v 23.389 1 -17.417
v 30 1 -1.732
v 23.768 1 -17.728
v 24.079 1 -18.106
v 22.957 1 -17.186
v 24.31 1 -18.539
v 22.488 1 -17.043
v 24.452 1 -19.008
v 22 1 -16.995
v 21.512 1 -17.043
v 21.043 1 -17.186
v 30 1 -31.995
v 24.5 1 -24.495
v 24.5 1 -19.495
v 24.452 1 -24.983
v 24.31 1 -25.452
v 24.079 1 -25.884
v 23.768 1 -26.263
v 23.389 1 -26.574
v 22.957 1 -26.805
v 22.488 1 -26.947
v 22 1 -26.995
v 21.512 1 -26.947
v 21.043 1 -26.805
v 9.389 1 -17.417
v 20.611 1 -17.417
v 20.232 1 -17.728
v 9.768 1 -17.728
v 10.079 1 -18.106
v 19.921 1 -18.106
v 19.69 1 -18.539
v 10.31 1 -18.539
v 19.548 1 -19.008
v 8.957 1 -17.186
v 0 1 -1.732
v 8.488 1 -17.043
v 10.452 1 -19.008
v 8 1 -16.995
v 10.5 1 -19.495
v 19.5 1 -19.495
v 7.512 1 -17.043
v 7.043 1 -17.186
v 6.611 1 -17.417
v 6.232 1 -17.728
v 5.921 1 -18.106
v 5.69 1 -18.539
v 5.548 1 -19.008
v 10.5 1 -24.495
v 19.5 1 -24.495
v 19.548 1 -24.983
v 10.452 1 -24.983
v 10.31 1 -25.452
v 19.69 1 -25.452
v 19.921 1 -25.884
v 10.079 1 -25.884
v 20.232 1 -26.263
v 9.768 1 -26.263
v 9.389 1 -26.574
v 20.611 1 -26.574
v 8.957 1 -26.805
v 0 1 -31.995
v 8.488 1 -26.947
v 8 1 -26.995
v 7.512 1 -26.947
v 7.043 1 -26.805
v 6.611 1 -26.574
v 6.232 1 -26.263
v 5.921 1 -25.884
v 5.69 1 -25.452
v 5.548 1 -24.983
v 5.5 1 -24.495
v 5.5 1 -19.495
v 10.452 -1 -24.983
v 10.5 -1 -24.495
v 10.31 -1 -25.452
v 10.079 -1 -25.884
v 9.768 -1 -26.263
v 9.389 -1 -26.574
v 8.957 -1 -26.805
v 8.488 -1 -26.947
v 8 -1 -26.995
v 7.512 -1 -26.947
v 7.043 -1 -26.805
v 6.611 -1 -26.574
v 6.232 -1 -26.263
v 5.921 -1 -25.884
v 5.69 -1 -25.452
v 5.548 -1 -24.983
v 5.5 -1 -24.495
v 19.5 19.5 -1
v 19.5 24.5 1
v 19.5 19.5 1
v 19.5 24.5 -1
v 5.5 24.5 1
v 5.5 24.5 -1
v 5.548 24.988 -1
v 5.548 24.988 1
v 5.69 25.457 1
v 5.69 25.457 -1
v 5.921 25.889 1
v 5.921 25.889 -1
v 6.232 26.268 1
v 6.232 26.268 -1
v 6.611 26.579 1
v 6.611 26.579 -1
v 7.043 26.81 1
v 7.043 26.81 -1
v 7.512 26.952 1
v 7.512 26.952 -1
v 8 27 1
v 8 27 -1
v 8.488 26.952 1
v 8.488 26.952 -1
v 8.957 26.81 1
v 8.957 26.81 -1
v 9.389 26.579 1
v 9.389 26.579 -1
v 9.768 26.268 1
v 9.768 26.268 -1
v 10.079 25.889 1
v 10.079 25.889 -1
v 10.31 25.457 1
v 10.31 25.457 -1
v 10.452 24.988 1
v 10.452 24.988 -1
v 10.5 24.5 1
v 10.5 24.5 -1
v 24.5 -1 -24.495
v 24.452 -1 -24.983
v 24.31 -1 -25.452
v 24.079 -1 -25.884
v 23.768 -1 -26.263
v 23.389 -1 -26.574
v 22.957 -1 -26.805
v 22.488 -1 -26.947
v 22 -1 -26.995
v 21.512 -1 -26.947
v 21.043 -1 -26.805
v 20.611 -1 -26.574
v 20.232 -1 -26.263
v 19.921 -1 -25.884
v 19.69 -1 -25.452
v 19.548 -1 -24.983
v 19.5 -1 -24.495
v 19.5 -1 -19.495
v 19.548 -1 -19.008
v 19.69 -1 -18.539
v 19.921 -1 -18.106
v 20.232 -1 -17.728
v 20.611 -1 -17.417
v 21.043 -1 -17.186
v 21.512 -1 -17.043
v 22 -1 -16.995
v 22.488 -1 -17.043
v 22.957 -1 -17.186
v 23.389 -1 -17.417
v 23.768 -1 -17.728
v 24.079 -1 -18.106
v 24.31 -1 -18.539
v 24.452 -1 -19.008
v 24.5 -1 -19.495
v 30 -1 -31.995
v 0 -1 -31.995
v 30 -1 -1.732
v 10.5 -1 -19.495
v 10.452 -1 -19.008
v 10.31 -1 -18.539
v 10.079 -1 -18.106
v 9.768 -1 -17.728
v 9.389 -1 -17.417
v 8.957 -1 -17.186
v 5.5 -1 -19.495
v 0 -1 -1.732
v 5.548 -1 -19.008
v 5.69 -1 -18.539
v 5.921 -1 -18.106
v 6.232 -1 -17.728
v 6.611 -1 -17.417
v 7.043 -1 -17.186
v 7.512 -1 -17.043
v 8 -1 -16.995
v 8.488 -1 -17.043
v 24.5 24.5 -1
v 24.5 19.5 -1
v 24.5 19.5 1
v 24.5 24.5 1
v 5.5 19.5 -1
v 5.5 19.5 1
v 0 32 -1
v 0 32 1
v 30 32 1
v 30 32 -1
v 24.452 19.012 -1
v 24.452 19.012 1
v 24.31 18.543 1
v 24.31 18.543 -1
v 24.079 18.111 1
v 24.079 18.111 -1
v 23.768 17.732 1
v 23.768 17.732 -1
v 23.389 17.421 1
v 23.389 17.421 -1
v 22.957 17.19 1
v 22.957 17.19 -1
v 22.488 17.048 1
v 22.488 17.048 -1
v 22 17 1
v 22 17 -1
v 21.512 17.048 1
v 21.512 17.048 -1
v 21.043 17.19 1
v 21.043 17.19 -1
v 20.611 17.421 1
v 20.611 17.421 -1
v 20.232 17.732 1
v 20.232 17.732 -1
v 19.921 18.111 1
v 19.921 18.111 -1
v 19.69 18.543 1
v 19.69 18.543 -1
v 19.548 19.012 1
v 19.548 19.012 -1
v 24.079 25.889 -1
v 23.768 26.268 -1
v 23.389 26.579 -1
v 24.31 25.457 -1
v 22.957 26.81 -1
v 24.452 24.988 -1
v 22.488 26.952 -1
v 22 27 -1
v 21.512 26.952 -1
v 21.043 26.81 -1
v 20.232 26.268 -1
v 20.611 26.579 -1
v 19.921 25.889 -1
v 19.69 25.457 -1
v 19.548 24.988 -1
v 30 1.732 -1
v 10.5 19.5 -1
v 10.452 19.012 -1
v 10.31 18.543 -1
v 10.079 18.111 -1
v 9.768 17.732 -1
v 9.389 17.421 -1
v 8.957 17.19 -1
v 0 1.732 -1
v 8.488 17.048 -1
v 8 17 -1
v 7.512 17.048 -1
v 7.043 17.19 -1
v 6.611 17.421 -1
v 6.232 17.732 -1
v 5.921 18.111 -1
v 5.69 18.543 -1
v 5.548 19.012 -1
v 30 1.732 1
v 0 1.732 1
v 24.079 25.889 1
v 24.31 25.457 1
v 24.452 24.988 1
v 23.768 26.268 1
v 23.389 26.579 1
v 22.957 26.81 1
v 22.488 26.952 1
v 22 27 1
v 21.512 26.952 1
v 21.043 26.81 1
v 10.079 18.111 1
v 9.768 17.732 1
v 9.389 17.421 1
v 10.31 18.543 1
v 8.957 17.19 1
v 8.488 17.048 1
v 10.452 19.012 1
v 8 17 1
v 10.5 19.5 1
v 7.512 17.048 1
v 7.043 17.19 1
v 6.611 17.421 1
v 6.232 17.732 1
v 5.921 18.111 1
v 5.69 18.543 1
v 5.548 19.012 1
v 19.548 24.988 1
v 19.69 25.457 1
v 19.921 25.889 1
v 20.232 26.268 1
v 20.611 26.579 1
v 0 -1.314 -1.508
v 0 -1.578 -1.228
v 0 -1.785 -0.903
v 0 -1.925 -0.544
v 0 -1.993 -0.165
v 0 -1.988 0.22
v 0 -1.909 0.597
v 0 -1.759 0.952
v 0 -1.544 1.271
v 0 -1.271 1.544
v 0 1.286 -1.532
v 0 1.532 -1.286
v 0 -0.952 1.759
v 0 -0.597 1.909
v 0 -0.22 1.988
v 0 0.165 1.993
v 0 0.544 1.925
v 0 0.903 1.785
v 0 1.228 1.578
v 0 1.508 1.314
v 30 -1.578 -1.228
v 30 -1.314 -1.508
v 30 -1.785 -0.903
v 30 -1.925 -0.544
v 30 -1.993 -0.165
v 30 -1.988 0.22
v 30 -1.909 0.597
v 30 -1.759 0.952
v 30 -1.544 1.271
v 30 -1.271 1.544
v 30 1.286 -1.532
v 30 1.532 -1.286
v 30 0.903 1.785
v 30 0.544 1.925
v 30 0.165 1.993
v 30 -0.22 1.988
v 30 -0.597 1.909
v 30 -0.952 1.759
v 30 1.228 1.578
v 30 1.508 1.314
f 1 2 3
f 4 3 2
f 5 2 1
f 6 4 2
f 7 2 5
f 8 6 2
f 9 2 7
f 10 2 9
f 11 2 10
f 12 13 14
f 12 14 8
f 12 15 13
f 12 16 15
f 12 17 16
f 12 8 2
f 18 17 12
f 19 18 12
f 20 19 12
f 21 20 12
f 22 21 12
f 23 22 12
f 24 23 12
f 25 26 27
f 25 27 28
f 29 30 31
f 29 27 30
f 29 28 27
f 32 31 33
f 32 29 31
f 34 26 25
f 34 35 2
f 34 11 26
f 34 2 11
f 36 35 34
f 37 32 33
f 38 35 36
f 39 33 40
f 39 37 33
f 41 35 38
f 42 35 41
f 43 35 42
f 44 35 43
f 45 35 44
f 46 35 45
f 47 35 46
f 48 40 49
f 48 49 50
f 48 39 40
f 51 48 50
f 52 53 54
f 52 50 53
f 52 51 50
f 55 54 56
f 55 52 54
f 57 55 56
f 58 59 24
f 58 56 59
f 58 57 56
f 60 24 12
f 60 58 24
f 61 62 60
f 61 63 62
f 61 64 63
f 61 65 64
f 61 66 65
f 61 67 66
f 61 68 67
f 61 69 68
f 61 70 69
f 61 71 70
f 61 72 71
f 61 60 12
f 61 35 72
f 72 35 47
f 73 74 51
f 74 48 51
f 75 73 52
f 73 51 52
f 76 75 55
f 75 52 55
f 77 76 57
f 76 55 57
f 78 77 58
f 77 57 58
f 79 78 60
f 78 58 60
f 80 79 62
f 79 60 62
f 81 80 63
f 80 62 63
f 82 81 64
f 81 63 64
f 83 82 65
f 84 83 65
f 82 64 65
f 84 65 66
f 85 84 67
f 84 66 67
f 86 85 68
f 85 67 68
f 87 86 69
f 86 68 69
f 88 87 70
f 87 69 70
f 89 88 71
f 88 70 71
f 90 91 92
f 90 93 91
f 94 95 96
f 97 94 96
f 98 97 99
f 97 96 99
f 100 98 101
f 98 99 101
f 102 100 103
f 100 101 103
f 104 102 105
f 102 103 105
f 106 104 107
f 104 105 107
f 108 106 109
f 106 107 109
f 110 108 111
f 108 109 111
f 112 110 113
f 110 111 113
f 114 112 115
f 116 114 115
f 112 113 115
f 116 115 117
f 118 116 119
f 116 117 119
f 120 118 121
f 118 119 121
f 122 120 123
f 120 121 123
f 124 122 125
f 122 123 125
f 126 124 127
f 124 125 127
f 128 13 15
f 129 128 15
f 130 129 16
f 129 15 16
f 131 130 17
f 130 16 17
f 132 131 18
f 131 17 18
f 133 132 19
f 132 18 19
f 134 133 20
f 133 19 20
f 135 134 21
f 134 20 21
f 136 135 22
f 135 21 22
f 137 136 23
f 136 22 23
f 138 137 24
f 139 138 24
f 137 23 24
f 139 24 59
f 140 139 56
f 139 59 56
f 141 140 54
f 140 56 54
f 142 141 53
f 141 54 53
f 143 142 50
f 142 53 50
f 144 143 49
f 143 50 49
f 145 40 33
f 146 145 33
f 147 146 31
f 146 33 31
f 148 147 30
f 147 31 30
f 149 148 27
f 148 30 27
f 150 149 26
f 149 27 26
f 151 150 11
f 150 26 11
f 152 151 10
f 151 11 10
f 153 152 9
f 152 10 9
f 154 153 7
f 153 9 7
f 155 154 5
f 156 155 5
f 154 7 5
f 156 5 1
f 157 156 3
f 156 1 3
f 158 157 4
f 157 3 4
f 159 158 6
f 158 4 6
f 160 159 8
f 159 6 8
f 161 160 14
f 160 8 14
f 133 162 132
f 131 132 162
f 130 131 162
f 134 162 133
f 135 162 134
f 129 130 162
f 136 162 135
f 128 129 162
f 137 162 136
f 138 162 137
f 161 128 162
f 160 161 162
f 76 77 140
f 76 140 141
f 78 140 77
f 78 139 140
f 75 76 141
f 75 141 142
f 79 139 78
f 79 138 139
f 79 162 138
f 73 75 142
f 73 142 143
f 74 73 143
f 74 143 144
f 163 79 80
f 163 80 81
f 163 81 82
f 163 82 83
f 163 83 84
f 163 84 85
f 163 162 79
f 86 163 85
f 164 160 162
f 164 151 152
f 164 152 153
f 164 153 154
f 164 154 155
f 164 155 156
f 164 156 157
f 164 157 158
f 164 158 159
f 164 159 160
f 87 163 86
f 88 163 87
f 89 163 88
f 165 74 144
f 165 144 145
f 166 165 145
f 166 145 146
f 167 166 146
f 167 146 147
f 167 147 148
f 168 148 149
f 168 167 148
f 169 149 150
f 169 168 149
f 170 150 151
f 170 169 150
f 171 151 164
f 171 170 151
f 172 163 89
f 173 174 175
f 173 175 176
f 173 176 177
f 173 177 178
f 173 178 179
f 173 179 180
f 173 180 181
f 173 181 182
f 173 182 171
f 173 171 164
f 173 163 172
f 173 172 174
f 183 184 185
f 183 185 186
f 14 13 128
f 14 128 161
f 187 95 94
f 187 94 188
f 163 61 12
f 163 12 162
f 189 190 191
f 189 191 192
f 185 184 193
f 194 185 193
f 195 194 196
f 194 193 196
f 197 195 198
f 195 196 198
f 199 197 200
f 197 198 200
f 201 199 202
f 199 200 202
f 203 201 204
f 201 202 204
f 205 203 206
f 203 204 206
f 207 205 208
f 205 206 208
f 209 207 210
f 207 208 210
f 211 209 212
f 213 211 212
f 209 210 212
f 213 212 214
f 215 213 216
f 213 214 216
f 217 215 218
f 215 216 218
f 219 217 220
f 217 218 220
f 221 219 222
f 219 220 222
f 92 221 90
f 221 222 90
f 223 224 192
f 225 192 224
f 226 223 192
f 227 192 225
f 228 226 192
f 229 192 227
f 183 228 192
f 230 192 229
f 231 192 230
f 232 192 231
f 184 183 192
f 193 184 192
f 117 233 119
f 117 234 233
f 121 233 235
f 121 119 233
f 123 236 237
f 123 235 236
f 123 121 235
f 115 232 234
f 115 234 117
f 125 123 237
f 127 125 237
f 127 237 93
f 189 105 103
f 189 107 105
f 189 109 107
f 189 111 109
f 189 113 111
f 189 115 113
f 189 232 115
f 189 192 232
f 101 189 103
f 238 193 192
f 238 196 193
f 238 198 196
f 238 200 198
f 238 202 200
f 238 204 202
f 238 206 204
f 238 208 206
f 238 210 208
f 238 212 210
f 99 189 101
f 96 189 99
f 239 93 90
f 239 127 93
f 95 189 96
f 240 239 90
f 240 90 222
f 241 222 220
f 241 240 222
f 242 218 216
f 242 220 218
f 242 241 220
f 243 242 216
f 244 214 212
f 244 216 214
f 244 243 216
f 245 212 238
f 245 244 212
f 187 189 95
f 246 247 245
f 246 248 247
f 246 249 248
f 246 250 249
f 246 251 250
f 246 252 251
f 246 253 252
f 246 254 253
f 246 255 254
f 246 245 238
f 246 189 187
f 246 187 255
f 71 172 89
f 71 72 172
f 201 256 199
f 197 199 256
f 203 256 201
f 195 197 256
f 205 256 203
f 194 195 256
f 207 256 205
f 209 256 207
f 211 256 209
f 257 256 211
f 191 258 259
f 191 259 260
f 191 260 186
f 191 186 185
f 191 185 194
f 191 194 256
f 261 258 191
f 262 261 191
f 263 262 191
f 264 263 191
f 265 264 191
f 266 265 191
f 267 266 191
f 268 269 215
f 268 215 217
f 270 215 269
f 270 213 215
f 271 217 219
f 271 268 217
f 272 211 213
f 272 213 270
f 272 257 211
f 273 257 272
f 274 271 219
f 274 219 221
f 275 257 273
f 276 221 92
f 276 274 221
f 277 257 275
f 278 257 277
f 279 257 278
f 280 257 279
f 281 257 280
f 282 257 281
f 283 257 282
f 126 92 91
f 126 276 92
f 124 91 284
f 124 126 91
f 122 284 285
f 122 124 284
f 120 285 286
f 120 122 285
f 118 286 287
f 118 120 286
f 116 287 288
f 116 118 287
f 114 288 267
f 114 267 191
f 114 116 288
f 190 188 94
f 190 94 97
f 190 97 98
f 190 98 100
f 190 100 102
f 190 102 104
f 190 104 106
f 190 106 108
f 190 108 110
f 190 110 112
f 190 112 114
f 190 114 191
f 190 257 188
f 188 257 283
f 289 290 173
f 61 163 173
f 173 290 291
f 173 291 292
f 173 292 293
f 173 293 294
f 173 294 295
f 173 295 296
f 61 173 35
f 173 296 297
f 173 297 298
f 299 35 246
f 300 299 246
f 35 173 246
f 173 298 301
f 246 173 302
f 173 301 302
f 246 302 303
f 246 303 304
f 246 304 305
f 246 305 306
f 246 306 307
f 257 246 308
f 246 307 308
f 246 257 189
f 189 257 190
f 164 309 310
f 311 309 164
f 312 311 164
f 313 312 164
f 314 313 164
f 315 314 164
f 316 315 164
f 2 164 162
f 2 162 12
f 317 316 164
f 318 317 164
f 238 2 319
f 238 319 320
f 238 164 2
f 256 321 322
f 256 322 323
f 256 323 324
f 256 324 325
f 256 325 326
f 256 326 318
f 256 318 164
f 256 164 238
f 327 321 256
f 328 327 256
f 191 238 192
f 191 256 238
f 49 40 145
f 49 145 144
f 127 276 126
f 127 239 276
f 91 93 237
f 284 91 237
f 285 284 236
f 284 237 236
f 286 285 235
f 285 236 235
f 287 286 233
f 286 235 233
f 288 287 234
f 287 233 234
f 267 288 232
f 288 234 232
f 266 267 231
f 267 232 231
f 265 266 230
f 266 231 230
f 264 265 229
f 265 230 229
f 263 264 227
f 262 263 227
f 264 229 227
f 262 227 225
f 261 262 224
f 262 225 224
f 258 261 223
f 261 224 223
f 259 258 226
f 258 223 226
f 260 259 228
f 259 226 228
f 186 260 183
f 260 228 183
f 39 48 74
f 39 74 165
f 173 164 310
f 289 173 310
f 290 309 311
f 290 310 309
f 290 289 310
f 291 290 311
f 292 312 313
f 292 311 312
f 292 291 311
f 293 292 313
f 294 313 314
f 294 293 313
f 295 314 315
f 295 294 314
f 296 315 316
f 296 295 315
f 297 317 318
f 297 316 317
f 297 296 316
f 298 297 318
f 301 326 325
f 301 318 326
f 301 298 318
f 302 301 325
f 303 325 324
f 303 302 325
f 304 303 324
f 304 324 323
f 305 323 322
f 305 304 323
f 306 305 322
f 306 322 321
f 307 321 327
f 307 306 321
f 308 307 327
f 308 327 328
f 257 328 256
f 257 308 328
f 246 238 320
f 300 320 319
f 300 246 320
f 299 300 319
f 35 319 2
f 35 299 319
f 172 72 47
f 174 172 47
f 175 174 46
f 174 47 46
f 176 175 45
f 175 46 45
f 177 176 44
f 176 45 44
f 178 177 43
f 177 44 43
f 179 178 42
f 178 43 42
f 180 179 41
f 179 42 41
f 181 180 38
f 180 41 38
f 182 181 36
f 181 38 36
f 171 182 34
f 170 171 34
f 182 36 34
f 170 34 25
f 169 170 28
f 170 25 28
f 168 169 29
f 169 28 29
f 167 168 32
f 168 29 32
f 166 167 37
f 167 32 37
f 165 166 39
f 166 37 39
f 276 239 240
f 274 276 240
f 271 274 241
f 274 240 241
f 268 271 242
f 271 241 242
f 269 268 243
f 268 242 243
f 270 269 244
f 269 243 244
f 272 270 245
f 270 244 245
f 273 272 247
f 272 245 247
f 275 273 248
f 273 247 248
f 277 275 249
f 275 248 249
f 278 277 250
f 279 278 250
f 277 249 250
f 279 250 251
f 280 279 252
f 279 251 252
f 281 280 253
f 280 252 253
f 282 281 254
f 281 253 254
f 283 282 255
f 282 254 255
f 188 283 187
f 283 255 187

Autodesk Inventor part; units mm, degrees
ref_plane "YZ Plane" through (0, 0, 0) normal (1, 0, 0) x (0, 1, 0)
ref_plane "XZ Plane" through (0, 0, 0) normal (0, 1, 0) x (-1, 0, 0)
ref_plane "XY Plane" through (0, 0, 0) normal (0, 0, 1) x (1, 0, 0)
sketch "Sketch1" plane through (0, 0, 0) normal (1, 0, 0) x (0, 1, 0)
  line L0 (1.7321, 1) -> (32, 1)
  line L1 (32, 1) -> (32, -1)
  line L2 (32, -1) -> (1.7321, -1)
  line L3 (1.7321, 1) -> (32, 1)
  line L4 (32, 1) -> (32, -1)
  line L5 (32, -1) -> (1.7321, -1)
  line L6 (1, -1.7273) -> (1, -31.9952)
  line L7 (1, -31.9952) -> (-1, -31.9952)
  line L8 (-1, -31.9952) -> (-1, -1.7273)
  arc A0 (1, -1.7321) -> (1.7321, -1) centre (0, 0) ccw
  arc A1 (1.7321, 1) -> (-1, -1.7321) centre (0, 0) ccw
  dimension "d6" = 2
  dimension "d8" = 30.2679
  dimension "d9" = 30.2679
  dimension "d33" = 2
extrude "Extrusion1" add sketch "Sketch1" along normal blind 30
sketch "Sketch2" plane through (0, 1, -1.7321) normal (0, 1, 0) x (1, 0, 0)
  line L0 (8, 22.7632) -> (8, 17.7632) construction
  line L1 (10.5, 22.7632) -> (10.5, 17.7632)
  line L2 (5.5, 17.7632) -> (5.5, 22.7632)
  arc A0 (10.5, 22.7632) -> (5.5, 22.7632) centre (8, 22.7632) ccw
  arc A1 (5.5, 17.7632) -> (10.5, 17.7632) centre (8, 17.7632) ccw
  line L3 (22, 22.7632) -> (22, 17.7632) construction
  line L4 (24.5, 22.7632) -> (24.5, 17.7632)
  line L5 (19.5, 17.7632) -> (19.5, 22.7632)
  arc A2 (24.5, 22.7632) -> (19.5, 22.7632) centre (22, 22.7632) ccw
  arc A3 (19.5, 17.7632) -> (24.5, 17.7632) centre (22, 17.7632) ccw
  line L6 (0, 30.2632) -> (30, 30.2632) projected
  line L7 (30, 30.2632) -> (30, 0) projected
  line L8 (0, 30.2632) -> (0, 0) projected
  point P0 (0, -1.7321)
  point P1 (8, 20.2632)
  point P2 (22, 20.2632)
  dimension "d12" = 5
  dimension "d13" = 10
  dimension "d14" = 5
  dimension "d15" = 10
  dimension "d16" = 10
  dimension "d17" = 10
  dimension "d18" = 8
  dimension "d19" = 8
extrude "Extrusion2" cut sketch "Sketch2" against normal blind 10
sketch "Sketch3" plane through (0, 1.7321, -1) normal (0, 0, -1) x (-1, 0, 0)
  line L0 (-5.5, -0.7321) -> (-10.5, -0.7321) projected
  line L1 (-10.5, -0.7321) -> (-5.5, -0.7321) projected
  line L2 (-19.5, -0.7321) -> (-24.5, -0.7321) projected
  line L3 (-24.5, -0.7321) -> (-19.5, -0.7321) projected
  line L4 (0, -0.7321) -> (-30, -0.7321) projected
  line L5 (0, -0.7321) -> (-30, -0.7321) projected
  line L6 (0, 0) -> (0, 30.2679) projected
  line L7 (0, 30.2679) -> (-30, 30.2679) projected
  line L8 (-30, 0) -> (-30, 30.2679) projected
  line L9 (0, 0) -> (-30, 0) projected
  line L10 (-5.5, -0.7321) -> (-10.5, -0.7321) projected
  line L11 (-10.5, -0.7321) -> (-5.5, -0.7321) projected
  line L12 (-19.5, -0.7321) -> (-24.5, -0.7321) projected
  line L13 (-24.5, -0.7321) -> (-19.5, -0.7321) projected
  line L14 (0, -0.7321) -> (-30, -0.7321) projected
  line L15 (0, -0.7321) -> (-30, -0.7321) projected
  line L16 (-5.5, -0.7321) -> (-10.5, -0.7321) projected
  line L17 (-10.5, -0.7321) -> (-5.5, -0.7321) projected
  line L18 (-19.5, -0.7321) -> (-24.5, -0.7321) projected
  line L19 (-24.5, -0.7321) -> (-19.5, -0.7321) projected
  line L20 (0, -0.7321) -> (-30, -0.7321) projected
  line L21 (0, -0.7321) -> (-30, -0.7321) projected
  line L22 (-5.5, -0.7321) -> (-10.5, -0.7321) projected
  line L23 (-10.5, -0.7321) -> (-5.5, -0.7321) projected
  line L24 (-19.5, -0.7321) -> (-24.5, -0.7321) projected
  line L25 (-24.5, -0.7321) -> (-19.5, -0.7321) projected
  line L26 (0, -0.7321) -> (-30, -0.7321) projected
  line L27 (0, -0.7321) -> (-30, -0.7321) projected
  line L28 (-22, 17.7679) -> (-22, 22.7679) construction
  line L29 (-24.5, 17.7679) -> (-24.5, 22.7679)
  line L30 (-19.5, 22.7679) -> (-19.5, 17.7679)
  arc A0 (-24.5, 17.7679) -> (-19.5, 17.7679) centre (-22, 17.7679) ccw
  arc A1 (-19.5, 22.7679) -> (-24.5, 22.7679) centre (-22, 22.7679) ccw
  line L31 (-8, 17.7679) -> (-8, 22.7679) construction
  line L32 (-10.5, 17.7679) -> (-10.5, 22.7679)
  line L33 (-5.5, 22.7679) -> (-5.5, 17.7679)
  arc A2 (-10.5, 17.7679) -> (-5.5, 17.7679) centre (-8, 17.7679) ccw
  arc A3 (-5.5, 22.7679) -> (-10.5, 22.7679) centre (-8, 22.7679) ccw
  point P0 (0, -1.7321)
  point P1 (-22, 20.2679)
  point P2 (-8, 20.2679)
  dimension "d23" = 10
  dimension "d24" = 5
  dimension "d25" = 10
  dimension "d26" = 8
  dimension "d27" = 10
  dimension "d28" = 5
  dimension "d29" = 8
  dimension "d30" = 10
extrude "Extrusion3" cut sketch "Sketch3" against normal blind 10 contours L29 A1 L30 A0 | L32 A3 L33 A2
equation "\"d17\" = d16"
equation "\"d19\" = d18"
equation "\"d29\" = d26"
equation "\"d30\" = d25"
properties part number "Hinge"
